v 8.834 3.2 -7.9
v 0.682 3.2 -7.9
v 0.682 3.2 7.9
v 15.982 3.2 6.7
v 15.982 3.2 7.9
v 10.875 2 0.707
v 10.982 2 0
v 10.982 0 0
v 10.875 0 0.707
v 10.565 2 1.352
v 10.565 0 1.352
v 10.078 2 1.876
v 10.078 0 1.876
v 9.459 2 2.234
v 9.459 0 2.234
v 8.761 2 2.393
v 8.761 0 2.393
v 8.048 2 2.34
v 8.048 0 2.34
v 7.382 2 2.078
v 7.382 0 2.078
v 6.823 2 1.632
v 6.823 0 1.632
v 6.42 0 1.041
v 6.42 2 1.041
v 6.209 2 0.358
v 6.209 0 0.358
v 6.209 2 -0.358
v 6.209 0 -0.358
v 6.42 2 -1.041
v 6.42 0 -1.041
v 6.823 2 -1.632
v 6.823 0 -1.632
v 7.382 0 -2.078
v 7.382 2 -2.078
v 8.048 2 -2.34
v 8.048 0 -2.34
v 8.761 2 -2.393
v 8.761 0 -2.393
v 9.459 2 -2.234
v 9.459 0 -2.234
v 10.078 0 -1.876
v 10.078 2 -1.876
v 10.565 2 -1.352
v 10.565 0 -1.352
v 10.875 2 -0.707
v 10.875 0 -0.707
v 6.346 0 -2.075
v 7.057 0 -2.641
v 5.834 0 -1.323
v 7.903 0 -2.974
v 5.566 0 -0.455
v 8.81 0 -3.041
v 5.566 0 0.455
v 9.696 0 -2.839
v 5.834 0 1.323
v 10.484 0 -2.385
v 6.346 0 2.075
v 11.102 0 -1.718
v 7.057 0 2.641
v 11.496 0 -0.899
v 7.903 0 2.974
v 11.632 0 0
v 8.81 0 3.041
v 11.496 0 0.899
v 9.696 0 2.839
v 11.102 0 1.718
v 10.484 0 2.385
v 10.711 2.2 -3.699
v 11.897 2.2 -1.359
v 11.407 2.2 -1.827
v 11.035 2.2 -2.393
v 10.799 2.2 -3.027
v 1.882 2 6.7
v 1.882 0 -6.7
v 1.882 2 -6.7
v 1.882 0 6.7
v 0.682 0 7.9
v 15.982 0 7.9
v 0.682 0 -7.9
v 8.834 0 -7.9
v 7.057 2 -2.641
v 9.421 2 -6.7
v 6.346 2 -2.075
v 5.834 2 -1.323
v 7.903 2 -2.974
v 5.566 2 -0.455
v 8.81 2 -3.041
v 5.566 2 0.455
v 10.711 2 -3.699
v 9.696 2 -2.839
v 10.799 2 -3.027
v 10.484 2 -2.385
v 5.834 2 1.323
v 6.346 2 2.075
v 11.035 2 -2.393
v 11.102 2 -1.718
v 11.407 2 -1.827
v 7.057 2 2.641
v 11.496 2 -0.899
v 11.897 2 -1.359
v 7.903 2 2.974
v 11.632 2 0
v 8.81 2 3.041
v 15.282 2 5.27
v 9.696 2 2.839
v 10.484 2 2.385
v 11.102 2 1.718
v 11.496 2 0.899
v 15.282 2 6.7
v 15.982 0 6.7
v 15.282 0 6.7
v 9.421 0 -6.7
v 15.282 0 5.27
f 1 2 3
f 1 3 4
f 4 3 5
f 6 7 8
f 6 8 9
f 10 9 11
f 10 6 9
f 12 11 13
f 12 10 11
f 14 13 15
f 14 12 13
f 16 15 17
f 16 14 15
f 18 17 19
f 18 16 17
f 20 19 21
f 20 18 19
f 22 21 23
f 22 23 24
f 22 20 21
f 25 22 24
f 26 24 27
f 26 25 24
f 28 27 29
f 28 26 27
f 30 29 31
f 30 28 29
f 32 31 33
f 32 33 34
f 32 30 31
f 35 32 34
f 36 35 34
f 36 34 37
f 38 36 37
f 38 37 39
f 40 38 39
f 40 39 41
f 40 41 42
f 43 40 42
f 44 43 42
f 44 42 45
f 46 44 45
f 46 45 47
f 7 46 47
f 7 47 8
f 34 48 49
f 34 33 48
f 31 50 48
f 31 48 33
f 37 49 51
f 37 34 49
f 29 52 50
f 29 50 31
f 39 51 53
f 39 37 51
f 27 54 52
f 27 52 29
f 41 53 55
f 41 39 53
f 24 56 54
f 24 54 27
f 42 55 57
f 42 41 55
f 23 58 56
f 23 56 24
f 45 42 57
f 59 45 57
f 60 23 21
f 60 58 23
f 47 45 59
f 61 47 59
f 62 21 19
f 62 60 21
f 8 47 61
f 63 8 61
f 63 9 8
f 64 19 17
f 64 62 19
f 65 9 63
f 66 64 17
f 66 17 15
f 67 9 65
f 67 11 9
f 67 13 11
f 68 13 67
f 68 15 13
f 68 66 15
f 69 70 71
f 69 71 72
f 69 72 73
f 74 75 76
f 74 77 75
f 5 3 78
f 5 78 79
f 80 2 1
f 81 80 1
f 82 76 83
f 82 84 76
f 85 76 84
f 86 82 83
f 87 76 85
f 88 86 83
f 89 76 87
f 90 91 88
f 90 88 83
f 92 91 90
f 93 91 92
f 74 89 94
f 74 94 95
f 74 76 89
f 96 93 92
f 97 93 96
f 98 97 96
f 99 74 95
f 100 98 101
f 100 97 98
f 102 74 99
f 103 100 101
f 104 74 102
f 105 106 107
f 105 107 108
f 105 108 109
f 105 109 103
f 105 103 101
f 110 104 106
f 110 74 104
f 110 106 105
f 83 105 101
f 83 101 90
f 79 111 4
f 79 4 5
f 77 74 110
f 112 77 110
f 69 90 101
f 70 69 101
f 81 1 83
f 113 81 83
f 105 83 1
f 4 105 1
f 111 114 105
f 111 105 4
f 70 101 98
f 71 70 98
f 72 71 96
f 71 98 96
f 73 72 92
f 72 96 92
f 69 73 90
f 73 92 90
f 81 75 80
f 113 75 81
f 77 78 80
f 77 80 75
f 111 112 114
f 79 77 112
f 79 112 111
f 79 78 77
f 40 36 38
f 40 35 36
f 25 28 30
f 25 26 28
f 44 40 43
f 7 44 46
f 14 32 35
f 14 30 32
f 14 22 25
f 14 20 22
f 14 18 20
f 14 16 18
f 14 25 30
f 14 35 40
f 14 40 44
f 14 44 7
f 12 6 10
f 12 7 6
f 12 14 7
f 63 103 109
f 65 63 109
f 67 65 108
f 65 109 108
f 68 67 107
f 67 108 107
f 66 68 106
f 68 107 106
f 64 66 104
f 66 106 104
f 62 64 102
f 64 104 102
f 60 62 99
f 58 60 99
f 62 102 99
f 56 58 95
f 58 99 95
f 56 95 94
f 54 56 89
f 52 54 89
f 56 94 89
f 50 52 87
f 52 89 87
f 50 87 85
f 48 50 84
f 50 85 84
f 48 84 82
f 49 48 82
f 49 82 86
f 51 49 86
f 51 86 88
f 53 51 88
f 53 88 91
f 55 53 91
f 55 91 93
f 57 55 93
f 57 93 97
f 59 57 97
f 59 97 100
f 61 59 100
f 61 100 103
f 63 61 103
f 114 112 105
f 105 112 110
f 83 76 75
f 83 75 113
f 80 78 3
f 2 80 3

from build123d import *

# Parameters (mm, degrees)
MAINBASESKETCH_W          = 15.8
MAINBASESKETCH_H          = 3.2
MAINBASEEXTRUDE_DEPTH     = 7.9
MAINBASESHELL_T           = -1.2
UNDERSIDECIRCLEEXT_START  = -0.2
UNDERSIDECIRCLESKETCH_R   = 3.05
UNDERSIDECIRCLESKETCH_R_2 = 2.4
UNDERSIDECIRCLEEXT_DEPTH  = 2.2
SECONDANGLEDCUT_DEPTH     = 19.555463972
SECONDNOTCH_DEPTH         = 2.2


with BuildPart() as part:
    # MainBaseSketch → MainBaseExtrude (new, symmetric)
    with BuildSketch(Plane.XY):
        with Locations((8.581967213, 1.6)):
            Rectangle(MAINBASESKETCH_W, MAINBASESKETCH_H)
    extrude(amount=MAINBASEEXTRUDE_DEPTH, both=True)

    # MainBaseShell
    mainbaseshell_openings = [part.faces().sort_by_distance(p)[0] for p in [
        (8.581967213, 0, 0),
    ]]
    offset(amount=MAINBASESHELL_T, openings=mainbaseshell_openings, kind=Kind.INTERSECTION)

    # UnderSideCircleSketch → UnderSideCircleExt (add)
    with BuildSketch(Plane.XZ.offset(-2).offset(UNDERSIDECIRCLEEXT_START)):
        with Locations((8.581967213, 0)):
            Circle(UNDERSIDECIRCLESKETCH_R)
        with Locations((8.581967213, 0)):
            Circle(UNDERSIDECIRCLESKETCH_R_2, mode=Mode.SUBTRACT)
    extrude(amount=UNDERSIDECIRCLEEXT_DEPTH)

    # Sketch53 → SecondAngledCut (cut, through all)
    with BuildSketch(Plane(origin=(0, 0, 0), x_dir=(-1, 0, 0), z_dir=(0, -1, 0))):
        Polygon((-8.833667893, 7.9), (-15.981967213, -6.7), (-15.981967213, -7.9), (-16.481967213, -7.9), (-16.481967213, 7.9), align=None)
    extrude(amount=-SECONDANGLEDCUT_DEPTH, mode=Mode.SUBTRACT)

    # Sketch56 → SecondNotch (cut)
    with BuildSketch(Plane(origin=(0, 0, 0), x_dir=(-1, 0, 0), z_dir=(0, -1, 0))):
        with BuildLine():
            Line((-10.711153505, 3.699172992), (-11.897271127, 1.358994981))
            ThreePointArc((-11.897271127, 1.358994981), (-11.034832221, 2.39254887), (-10.711153505, 3.699172992))
        make_face()
    extrude(amount=-SECONDNOTCH_DEPTH, mode=Mode.SUBTRACT)


solid = part.part
